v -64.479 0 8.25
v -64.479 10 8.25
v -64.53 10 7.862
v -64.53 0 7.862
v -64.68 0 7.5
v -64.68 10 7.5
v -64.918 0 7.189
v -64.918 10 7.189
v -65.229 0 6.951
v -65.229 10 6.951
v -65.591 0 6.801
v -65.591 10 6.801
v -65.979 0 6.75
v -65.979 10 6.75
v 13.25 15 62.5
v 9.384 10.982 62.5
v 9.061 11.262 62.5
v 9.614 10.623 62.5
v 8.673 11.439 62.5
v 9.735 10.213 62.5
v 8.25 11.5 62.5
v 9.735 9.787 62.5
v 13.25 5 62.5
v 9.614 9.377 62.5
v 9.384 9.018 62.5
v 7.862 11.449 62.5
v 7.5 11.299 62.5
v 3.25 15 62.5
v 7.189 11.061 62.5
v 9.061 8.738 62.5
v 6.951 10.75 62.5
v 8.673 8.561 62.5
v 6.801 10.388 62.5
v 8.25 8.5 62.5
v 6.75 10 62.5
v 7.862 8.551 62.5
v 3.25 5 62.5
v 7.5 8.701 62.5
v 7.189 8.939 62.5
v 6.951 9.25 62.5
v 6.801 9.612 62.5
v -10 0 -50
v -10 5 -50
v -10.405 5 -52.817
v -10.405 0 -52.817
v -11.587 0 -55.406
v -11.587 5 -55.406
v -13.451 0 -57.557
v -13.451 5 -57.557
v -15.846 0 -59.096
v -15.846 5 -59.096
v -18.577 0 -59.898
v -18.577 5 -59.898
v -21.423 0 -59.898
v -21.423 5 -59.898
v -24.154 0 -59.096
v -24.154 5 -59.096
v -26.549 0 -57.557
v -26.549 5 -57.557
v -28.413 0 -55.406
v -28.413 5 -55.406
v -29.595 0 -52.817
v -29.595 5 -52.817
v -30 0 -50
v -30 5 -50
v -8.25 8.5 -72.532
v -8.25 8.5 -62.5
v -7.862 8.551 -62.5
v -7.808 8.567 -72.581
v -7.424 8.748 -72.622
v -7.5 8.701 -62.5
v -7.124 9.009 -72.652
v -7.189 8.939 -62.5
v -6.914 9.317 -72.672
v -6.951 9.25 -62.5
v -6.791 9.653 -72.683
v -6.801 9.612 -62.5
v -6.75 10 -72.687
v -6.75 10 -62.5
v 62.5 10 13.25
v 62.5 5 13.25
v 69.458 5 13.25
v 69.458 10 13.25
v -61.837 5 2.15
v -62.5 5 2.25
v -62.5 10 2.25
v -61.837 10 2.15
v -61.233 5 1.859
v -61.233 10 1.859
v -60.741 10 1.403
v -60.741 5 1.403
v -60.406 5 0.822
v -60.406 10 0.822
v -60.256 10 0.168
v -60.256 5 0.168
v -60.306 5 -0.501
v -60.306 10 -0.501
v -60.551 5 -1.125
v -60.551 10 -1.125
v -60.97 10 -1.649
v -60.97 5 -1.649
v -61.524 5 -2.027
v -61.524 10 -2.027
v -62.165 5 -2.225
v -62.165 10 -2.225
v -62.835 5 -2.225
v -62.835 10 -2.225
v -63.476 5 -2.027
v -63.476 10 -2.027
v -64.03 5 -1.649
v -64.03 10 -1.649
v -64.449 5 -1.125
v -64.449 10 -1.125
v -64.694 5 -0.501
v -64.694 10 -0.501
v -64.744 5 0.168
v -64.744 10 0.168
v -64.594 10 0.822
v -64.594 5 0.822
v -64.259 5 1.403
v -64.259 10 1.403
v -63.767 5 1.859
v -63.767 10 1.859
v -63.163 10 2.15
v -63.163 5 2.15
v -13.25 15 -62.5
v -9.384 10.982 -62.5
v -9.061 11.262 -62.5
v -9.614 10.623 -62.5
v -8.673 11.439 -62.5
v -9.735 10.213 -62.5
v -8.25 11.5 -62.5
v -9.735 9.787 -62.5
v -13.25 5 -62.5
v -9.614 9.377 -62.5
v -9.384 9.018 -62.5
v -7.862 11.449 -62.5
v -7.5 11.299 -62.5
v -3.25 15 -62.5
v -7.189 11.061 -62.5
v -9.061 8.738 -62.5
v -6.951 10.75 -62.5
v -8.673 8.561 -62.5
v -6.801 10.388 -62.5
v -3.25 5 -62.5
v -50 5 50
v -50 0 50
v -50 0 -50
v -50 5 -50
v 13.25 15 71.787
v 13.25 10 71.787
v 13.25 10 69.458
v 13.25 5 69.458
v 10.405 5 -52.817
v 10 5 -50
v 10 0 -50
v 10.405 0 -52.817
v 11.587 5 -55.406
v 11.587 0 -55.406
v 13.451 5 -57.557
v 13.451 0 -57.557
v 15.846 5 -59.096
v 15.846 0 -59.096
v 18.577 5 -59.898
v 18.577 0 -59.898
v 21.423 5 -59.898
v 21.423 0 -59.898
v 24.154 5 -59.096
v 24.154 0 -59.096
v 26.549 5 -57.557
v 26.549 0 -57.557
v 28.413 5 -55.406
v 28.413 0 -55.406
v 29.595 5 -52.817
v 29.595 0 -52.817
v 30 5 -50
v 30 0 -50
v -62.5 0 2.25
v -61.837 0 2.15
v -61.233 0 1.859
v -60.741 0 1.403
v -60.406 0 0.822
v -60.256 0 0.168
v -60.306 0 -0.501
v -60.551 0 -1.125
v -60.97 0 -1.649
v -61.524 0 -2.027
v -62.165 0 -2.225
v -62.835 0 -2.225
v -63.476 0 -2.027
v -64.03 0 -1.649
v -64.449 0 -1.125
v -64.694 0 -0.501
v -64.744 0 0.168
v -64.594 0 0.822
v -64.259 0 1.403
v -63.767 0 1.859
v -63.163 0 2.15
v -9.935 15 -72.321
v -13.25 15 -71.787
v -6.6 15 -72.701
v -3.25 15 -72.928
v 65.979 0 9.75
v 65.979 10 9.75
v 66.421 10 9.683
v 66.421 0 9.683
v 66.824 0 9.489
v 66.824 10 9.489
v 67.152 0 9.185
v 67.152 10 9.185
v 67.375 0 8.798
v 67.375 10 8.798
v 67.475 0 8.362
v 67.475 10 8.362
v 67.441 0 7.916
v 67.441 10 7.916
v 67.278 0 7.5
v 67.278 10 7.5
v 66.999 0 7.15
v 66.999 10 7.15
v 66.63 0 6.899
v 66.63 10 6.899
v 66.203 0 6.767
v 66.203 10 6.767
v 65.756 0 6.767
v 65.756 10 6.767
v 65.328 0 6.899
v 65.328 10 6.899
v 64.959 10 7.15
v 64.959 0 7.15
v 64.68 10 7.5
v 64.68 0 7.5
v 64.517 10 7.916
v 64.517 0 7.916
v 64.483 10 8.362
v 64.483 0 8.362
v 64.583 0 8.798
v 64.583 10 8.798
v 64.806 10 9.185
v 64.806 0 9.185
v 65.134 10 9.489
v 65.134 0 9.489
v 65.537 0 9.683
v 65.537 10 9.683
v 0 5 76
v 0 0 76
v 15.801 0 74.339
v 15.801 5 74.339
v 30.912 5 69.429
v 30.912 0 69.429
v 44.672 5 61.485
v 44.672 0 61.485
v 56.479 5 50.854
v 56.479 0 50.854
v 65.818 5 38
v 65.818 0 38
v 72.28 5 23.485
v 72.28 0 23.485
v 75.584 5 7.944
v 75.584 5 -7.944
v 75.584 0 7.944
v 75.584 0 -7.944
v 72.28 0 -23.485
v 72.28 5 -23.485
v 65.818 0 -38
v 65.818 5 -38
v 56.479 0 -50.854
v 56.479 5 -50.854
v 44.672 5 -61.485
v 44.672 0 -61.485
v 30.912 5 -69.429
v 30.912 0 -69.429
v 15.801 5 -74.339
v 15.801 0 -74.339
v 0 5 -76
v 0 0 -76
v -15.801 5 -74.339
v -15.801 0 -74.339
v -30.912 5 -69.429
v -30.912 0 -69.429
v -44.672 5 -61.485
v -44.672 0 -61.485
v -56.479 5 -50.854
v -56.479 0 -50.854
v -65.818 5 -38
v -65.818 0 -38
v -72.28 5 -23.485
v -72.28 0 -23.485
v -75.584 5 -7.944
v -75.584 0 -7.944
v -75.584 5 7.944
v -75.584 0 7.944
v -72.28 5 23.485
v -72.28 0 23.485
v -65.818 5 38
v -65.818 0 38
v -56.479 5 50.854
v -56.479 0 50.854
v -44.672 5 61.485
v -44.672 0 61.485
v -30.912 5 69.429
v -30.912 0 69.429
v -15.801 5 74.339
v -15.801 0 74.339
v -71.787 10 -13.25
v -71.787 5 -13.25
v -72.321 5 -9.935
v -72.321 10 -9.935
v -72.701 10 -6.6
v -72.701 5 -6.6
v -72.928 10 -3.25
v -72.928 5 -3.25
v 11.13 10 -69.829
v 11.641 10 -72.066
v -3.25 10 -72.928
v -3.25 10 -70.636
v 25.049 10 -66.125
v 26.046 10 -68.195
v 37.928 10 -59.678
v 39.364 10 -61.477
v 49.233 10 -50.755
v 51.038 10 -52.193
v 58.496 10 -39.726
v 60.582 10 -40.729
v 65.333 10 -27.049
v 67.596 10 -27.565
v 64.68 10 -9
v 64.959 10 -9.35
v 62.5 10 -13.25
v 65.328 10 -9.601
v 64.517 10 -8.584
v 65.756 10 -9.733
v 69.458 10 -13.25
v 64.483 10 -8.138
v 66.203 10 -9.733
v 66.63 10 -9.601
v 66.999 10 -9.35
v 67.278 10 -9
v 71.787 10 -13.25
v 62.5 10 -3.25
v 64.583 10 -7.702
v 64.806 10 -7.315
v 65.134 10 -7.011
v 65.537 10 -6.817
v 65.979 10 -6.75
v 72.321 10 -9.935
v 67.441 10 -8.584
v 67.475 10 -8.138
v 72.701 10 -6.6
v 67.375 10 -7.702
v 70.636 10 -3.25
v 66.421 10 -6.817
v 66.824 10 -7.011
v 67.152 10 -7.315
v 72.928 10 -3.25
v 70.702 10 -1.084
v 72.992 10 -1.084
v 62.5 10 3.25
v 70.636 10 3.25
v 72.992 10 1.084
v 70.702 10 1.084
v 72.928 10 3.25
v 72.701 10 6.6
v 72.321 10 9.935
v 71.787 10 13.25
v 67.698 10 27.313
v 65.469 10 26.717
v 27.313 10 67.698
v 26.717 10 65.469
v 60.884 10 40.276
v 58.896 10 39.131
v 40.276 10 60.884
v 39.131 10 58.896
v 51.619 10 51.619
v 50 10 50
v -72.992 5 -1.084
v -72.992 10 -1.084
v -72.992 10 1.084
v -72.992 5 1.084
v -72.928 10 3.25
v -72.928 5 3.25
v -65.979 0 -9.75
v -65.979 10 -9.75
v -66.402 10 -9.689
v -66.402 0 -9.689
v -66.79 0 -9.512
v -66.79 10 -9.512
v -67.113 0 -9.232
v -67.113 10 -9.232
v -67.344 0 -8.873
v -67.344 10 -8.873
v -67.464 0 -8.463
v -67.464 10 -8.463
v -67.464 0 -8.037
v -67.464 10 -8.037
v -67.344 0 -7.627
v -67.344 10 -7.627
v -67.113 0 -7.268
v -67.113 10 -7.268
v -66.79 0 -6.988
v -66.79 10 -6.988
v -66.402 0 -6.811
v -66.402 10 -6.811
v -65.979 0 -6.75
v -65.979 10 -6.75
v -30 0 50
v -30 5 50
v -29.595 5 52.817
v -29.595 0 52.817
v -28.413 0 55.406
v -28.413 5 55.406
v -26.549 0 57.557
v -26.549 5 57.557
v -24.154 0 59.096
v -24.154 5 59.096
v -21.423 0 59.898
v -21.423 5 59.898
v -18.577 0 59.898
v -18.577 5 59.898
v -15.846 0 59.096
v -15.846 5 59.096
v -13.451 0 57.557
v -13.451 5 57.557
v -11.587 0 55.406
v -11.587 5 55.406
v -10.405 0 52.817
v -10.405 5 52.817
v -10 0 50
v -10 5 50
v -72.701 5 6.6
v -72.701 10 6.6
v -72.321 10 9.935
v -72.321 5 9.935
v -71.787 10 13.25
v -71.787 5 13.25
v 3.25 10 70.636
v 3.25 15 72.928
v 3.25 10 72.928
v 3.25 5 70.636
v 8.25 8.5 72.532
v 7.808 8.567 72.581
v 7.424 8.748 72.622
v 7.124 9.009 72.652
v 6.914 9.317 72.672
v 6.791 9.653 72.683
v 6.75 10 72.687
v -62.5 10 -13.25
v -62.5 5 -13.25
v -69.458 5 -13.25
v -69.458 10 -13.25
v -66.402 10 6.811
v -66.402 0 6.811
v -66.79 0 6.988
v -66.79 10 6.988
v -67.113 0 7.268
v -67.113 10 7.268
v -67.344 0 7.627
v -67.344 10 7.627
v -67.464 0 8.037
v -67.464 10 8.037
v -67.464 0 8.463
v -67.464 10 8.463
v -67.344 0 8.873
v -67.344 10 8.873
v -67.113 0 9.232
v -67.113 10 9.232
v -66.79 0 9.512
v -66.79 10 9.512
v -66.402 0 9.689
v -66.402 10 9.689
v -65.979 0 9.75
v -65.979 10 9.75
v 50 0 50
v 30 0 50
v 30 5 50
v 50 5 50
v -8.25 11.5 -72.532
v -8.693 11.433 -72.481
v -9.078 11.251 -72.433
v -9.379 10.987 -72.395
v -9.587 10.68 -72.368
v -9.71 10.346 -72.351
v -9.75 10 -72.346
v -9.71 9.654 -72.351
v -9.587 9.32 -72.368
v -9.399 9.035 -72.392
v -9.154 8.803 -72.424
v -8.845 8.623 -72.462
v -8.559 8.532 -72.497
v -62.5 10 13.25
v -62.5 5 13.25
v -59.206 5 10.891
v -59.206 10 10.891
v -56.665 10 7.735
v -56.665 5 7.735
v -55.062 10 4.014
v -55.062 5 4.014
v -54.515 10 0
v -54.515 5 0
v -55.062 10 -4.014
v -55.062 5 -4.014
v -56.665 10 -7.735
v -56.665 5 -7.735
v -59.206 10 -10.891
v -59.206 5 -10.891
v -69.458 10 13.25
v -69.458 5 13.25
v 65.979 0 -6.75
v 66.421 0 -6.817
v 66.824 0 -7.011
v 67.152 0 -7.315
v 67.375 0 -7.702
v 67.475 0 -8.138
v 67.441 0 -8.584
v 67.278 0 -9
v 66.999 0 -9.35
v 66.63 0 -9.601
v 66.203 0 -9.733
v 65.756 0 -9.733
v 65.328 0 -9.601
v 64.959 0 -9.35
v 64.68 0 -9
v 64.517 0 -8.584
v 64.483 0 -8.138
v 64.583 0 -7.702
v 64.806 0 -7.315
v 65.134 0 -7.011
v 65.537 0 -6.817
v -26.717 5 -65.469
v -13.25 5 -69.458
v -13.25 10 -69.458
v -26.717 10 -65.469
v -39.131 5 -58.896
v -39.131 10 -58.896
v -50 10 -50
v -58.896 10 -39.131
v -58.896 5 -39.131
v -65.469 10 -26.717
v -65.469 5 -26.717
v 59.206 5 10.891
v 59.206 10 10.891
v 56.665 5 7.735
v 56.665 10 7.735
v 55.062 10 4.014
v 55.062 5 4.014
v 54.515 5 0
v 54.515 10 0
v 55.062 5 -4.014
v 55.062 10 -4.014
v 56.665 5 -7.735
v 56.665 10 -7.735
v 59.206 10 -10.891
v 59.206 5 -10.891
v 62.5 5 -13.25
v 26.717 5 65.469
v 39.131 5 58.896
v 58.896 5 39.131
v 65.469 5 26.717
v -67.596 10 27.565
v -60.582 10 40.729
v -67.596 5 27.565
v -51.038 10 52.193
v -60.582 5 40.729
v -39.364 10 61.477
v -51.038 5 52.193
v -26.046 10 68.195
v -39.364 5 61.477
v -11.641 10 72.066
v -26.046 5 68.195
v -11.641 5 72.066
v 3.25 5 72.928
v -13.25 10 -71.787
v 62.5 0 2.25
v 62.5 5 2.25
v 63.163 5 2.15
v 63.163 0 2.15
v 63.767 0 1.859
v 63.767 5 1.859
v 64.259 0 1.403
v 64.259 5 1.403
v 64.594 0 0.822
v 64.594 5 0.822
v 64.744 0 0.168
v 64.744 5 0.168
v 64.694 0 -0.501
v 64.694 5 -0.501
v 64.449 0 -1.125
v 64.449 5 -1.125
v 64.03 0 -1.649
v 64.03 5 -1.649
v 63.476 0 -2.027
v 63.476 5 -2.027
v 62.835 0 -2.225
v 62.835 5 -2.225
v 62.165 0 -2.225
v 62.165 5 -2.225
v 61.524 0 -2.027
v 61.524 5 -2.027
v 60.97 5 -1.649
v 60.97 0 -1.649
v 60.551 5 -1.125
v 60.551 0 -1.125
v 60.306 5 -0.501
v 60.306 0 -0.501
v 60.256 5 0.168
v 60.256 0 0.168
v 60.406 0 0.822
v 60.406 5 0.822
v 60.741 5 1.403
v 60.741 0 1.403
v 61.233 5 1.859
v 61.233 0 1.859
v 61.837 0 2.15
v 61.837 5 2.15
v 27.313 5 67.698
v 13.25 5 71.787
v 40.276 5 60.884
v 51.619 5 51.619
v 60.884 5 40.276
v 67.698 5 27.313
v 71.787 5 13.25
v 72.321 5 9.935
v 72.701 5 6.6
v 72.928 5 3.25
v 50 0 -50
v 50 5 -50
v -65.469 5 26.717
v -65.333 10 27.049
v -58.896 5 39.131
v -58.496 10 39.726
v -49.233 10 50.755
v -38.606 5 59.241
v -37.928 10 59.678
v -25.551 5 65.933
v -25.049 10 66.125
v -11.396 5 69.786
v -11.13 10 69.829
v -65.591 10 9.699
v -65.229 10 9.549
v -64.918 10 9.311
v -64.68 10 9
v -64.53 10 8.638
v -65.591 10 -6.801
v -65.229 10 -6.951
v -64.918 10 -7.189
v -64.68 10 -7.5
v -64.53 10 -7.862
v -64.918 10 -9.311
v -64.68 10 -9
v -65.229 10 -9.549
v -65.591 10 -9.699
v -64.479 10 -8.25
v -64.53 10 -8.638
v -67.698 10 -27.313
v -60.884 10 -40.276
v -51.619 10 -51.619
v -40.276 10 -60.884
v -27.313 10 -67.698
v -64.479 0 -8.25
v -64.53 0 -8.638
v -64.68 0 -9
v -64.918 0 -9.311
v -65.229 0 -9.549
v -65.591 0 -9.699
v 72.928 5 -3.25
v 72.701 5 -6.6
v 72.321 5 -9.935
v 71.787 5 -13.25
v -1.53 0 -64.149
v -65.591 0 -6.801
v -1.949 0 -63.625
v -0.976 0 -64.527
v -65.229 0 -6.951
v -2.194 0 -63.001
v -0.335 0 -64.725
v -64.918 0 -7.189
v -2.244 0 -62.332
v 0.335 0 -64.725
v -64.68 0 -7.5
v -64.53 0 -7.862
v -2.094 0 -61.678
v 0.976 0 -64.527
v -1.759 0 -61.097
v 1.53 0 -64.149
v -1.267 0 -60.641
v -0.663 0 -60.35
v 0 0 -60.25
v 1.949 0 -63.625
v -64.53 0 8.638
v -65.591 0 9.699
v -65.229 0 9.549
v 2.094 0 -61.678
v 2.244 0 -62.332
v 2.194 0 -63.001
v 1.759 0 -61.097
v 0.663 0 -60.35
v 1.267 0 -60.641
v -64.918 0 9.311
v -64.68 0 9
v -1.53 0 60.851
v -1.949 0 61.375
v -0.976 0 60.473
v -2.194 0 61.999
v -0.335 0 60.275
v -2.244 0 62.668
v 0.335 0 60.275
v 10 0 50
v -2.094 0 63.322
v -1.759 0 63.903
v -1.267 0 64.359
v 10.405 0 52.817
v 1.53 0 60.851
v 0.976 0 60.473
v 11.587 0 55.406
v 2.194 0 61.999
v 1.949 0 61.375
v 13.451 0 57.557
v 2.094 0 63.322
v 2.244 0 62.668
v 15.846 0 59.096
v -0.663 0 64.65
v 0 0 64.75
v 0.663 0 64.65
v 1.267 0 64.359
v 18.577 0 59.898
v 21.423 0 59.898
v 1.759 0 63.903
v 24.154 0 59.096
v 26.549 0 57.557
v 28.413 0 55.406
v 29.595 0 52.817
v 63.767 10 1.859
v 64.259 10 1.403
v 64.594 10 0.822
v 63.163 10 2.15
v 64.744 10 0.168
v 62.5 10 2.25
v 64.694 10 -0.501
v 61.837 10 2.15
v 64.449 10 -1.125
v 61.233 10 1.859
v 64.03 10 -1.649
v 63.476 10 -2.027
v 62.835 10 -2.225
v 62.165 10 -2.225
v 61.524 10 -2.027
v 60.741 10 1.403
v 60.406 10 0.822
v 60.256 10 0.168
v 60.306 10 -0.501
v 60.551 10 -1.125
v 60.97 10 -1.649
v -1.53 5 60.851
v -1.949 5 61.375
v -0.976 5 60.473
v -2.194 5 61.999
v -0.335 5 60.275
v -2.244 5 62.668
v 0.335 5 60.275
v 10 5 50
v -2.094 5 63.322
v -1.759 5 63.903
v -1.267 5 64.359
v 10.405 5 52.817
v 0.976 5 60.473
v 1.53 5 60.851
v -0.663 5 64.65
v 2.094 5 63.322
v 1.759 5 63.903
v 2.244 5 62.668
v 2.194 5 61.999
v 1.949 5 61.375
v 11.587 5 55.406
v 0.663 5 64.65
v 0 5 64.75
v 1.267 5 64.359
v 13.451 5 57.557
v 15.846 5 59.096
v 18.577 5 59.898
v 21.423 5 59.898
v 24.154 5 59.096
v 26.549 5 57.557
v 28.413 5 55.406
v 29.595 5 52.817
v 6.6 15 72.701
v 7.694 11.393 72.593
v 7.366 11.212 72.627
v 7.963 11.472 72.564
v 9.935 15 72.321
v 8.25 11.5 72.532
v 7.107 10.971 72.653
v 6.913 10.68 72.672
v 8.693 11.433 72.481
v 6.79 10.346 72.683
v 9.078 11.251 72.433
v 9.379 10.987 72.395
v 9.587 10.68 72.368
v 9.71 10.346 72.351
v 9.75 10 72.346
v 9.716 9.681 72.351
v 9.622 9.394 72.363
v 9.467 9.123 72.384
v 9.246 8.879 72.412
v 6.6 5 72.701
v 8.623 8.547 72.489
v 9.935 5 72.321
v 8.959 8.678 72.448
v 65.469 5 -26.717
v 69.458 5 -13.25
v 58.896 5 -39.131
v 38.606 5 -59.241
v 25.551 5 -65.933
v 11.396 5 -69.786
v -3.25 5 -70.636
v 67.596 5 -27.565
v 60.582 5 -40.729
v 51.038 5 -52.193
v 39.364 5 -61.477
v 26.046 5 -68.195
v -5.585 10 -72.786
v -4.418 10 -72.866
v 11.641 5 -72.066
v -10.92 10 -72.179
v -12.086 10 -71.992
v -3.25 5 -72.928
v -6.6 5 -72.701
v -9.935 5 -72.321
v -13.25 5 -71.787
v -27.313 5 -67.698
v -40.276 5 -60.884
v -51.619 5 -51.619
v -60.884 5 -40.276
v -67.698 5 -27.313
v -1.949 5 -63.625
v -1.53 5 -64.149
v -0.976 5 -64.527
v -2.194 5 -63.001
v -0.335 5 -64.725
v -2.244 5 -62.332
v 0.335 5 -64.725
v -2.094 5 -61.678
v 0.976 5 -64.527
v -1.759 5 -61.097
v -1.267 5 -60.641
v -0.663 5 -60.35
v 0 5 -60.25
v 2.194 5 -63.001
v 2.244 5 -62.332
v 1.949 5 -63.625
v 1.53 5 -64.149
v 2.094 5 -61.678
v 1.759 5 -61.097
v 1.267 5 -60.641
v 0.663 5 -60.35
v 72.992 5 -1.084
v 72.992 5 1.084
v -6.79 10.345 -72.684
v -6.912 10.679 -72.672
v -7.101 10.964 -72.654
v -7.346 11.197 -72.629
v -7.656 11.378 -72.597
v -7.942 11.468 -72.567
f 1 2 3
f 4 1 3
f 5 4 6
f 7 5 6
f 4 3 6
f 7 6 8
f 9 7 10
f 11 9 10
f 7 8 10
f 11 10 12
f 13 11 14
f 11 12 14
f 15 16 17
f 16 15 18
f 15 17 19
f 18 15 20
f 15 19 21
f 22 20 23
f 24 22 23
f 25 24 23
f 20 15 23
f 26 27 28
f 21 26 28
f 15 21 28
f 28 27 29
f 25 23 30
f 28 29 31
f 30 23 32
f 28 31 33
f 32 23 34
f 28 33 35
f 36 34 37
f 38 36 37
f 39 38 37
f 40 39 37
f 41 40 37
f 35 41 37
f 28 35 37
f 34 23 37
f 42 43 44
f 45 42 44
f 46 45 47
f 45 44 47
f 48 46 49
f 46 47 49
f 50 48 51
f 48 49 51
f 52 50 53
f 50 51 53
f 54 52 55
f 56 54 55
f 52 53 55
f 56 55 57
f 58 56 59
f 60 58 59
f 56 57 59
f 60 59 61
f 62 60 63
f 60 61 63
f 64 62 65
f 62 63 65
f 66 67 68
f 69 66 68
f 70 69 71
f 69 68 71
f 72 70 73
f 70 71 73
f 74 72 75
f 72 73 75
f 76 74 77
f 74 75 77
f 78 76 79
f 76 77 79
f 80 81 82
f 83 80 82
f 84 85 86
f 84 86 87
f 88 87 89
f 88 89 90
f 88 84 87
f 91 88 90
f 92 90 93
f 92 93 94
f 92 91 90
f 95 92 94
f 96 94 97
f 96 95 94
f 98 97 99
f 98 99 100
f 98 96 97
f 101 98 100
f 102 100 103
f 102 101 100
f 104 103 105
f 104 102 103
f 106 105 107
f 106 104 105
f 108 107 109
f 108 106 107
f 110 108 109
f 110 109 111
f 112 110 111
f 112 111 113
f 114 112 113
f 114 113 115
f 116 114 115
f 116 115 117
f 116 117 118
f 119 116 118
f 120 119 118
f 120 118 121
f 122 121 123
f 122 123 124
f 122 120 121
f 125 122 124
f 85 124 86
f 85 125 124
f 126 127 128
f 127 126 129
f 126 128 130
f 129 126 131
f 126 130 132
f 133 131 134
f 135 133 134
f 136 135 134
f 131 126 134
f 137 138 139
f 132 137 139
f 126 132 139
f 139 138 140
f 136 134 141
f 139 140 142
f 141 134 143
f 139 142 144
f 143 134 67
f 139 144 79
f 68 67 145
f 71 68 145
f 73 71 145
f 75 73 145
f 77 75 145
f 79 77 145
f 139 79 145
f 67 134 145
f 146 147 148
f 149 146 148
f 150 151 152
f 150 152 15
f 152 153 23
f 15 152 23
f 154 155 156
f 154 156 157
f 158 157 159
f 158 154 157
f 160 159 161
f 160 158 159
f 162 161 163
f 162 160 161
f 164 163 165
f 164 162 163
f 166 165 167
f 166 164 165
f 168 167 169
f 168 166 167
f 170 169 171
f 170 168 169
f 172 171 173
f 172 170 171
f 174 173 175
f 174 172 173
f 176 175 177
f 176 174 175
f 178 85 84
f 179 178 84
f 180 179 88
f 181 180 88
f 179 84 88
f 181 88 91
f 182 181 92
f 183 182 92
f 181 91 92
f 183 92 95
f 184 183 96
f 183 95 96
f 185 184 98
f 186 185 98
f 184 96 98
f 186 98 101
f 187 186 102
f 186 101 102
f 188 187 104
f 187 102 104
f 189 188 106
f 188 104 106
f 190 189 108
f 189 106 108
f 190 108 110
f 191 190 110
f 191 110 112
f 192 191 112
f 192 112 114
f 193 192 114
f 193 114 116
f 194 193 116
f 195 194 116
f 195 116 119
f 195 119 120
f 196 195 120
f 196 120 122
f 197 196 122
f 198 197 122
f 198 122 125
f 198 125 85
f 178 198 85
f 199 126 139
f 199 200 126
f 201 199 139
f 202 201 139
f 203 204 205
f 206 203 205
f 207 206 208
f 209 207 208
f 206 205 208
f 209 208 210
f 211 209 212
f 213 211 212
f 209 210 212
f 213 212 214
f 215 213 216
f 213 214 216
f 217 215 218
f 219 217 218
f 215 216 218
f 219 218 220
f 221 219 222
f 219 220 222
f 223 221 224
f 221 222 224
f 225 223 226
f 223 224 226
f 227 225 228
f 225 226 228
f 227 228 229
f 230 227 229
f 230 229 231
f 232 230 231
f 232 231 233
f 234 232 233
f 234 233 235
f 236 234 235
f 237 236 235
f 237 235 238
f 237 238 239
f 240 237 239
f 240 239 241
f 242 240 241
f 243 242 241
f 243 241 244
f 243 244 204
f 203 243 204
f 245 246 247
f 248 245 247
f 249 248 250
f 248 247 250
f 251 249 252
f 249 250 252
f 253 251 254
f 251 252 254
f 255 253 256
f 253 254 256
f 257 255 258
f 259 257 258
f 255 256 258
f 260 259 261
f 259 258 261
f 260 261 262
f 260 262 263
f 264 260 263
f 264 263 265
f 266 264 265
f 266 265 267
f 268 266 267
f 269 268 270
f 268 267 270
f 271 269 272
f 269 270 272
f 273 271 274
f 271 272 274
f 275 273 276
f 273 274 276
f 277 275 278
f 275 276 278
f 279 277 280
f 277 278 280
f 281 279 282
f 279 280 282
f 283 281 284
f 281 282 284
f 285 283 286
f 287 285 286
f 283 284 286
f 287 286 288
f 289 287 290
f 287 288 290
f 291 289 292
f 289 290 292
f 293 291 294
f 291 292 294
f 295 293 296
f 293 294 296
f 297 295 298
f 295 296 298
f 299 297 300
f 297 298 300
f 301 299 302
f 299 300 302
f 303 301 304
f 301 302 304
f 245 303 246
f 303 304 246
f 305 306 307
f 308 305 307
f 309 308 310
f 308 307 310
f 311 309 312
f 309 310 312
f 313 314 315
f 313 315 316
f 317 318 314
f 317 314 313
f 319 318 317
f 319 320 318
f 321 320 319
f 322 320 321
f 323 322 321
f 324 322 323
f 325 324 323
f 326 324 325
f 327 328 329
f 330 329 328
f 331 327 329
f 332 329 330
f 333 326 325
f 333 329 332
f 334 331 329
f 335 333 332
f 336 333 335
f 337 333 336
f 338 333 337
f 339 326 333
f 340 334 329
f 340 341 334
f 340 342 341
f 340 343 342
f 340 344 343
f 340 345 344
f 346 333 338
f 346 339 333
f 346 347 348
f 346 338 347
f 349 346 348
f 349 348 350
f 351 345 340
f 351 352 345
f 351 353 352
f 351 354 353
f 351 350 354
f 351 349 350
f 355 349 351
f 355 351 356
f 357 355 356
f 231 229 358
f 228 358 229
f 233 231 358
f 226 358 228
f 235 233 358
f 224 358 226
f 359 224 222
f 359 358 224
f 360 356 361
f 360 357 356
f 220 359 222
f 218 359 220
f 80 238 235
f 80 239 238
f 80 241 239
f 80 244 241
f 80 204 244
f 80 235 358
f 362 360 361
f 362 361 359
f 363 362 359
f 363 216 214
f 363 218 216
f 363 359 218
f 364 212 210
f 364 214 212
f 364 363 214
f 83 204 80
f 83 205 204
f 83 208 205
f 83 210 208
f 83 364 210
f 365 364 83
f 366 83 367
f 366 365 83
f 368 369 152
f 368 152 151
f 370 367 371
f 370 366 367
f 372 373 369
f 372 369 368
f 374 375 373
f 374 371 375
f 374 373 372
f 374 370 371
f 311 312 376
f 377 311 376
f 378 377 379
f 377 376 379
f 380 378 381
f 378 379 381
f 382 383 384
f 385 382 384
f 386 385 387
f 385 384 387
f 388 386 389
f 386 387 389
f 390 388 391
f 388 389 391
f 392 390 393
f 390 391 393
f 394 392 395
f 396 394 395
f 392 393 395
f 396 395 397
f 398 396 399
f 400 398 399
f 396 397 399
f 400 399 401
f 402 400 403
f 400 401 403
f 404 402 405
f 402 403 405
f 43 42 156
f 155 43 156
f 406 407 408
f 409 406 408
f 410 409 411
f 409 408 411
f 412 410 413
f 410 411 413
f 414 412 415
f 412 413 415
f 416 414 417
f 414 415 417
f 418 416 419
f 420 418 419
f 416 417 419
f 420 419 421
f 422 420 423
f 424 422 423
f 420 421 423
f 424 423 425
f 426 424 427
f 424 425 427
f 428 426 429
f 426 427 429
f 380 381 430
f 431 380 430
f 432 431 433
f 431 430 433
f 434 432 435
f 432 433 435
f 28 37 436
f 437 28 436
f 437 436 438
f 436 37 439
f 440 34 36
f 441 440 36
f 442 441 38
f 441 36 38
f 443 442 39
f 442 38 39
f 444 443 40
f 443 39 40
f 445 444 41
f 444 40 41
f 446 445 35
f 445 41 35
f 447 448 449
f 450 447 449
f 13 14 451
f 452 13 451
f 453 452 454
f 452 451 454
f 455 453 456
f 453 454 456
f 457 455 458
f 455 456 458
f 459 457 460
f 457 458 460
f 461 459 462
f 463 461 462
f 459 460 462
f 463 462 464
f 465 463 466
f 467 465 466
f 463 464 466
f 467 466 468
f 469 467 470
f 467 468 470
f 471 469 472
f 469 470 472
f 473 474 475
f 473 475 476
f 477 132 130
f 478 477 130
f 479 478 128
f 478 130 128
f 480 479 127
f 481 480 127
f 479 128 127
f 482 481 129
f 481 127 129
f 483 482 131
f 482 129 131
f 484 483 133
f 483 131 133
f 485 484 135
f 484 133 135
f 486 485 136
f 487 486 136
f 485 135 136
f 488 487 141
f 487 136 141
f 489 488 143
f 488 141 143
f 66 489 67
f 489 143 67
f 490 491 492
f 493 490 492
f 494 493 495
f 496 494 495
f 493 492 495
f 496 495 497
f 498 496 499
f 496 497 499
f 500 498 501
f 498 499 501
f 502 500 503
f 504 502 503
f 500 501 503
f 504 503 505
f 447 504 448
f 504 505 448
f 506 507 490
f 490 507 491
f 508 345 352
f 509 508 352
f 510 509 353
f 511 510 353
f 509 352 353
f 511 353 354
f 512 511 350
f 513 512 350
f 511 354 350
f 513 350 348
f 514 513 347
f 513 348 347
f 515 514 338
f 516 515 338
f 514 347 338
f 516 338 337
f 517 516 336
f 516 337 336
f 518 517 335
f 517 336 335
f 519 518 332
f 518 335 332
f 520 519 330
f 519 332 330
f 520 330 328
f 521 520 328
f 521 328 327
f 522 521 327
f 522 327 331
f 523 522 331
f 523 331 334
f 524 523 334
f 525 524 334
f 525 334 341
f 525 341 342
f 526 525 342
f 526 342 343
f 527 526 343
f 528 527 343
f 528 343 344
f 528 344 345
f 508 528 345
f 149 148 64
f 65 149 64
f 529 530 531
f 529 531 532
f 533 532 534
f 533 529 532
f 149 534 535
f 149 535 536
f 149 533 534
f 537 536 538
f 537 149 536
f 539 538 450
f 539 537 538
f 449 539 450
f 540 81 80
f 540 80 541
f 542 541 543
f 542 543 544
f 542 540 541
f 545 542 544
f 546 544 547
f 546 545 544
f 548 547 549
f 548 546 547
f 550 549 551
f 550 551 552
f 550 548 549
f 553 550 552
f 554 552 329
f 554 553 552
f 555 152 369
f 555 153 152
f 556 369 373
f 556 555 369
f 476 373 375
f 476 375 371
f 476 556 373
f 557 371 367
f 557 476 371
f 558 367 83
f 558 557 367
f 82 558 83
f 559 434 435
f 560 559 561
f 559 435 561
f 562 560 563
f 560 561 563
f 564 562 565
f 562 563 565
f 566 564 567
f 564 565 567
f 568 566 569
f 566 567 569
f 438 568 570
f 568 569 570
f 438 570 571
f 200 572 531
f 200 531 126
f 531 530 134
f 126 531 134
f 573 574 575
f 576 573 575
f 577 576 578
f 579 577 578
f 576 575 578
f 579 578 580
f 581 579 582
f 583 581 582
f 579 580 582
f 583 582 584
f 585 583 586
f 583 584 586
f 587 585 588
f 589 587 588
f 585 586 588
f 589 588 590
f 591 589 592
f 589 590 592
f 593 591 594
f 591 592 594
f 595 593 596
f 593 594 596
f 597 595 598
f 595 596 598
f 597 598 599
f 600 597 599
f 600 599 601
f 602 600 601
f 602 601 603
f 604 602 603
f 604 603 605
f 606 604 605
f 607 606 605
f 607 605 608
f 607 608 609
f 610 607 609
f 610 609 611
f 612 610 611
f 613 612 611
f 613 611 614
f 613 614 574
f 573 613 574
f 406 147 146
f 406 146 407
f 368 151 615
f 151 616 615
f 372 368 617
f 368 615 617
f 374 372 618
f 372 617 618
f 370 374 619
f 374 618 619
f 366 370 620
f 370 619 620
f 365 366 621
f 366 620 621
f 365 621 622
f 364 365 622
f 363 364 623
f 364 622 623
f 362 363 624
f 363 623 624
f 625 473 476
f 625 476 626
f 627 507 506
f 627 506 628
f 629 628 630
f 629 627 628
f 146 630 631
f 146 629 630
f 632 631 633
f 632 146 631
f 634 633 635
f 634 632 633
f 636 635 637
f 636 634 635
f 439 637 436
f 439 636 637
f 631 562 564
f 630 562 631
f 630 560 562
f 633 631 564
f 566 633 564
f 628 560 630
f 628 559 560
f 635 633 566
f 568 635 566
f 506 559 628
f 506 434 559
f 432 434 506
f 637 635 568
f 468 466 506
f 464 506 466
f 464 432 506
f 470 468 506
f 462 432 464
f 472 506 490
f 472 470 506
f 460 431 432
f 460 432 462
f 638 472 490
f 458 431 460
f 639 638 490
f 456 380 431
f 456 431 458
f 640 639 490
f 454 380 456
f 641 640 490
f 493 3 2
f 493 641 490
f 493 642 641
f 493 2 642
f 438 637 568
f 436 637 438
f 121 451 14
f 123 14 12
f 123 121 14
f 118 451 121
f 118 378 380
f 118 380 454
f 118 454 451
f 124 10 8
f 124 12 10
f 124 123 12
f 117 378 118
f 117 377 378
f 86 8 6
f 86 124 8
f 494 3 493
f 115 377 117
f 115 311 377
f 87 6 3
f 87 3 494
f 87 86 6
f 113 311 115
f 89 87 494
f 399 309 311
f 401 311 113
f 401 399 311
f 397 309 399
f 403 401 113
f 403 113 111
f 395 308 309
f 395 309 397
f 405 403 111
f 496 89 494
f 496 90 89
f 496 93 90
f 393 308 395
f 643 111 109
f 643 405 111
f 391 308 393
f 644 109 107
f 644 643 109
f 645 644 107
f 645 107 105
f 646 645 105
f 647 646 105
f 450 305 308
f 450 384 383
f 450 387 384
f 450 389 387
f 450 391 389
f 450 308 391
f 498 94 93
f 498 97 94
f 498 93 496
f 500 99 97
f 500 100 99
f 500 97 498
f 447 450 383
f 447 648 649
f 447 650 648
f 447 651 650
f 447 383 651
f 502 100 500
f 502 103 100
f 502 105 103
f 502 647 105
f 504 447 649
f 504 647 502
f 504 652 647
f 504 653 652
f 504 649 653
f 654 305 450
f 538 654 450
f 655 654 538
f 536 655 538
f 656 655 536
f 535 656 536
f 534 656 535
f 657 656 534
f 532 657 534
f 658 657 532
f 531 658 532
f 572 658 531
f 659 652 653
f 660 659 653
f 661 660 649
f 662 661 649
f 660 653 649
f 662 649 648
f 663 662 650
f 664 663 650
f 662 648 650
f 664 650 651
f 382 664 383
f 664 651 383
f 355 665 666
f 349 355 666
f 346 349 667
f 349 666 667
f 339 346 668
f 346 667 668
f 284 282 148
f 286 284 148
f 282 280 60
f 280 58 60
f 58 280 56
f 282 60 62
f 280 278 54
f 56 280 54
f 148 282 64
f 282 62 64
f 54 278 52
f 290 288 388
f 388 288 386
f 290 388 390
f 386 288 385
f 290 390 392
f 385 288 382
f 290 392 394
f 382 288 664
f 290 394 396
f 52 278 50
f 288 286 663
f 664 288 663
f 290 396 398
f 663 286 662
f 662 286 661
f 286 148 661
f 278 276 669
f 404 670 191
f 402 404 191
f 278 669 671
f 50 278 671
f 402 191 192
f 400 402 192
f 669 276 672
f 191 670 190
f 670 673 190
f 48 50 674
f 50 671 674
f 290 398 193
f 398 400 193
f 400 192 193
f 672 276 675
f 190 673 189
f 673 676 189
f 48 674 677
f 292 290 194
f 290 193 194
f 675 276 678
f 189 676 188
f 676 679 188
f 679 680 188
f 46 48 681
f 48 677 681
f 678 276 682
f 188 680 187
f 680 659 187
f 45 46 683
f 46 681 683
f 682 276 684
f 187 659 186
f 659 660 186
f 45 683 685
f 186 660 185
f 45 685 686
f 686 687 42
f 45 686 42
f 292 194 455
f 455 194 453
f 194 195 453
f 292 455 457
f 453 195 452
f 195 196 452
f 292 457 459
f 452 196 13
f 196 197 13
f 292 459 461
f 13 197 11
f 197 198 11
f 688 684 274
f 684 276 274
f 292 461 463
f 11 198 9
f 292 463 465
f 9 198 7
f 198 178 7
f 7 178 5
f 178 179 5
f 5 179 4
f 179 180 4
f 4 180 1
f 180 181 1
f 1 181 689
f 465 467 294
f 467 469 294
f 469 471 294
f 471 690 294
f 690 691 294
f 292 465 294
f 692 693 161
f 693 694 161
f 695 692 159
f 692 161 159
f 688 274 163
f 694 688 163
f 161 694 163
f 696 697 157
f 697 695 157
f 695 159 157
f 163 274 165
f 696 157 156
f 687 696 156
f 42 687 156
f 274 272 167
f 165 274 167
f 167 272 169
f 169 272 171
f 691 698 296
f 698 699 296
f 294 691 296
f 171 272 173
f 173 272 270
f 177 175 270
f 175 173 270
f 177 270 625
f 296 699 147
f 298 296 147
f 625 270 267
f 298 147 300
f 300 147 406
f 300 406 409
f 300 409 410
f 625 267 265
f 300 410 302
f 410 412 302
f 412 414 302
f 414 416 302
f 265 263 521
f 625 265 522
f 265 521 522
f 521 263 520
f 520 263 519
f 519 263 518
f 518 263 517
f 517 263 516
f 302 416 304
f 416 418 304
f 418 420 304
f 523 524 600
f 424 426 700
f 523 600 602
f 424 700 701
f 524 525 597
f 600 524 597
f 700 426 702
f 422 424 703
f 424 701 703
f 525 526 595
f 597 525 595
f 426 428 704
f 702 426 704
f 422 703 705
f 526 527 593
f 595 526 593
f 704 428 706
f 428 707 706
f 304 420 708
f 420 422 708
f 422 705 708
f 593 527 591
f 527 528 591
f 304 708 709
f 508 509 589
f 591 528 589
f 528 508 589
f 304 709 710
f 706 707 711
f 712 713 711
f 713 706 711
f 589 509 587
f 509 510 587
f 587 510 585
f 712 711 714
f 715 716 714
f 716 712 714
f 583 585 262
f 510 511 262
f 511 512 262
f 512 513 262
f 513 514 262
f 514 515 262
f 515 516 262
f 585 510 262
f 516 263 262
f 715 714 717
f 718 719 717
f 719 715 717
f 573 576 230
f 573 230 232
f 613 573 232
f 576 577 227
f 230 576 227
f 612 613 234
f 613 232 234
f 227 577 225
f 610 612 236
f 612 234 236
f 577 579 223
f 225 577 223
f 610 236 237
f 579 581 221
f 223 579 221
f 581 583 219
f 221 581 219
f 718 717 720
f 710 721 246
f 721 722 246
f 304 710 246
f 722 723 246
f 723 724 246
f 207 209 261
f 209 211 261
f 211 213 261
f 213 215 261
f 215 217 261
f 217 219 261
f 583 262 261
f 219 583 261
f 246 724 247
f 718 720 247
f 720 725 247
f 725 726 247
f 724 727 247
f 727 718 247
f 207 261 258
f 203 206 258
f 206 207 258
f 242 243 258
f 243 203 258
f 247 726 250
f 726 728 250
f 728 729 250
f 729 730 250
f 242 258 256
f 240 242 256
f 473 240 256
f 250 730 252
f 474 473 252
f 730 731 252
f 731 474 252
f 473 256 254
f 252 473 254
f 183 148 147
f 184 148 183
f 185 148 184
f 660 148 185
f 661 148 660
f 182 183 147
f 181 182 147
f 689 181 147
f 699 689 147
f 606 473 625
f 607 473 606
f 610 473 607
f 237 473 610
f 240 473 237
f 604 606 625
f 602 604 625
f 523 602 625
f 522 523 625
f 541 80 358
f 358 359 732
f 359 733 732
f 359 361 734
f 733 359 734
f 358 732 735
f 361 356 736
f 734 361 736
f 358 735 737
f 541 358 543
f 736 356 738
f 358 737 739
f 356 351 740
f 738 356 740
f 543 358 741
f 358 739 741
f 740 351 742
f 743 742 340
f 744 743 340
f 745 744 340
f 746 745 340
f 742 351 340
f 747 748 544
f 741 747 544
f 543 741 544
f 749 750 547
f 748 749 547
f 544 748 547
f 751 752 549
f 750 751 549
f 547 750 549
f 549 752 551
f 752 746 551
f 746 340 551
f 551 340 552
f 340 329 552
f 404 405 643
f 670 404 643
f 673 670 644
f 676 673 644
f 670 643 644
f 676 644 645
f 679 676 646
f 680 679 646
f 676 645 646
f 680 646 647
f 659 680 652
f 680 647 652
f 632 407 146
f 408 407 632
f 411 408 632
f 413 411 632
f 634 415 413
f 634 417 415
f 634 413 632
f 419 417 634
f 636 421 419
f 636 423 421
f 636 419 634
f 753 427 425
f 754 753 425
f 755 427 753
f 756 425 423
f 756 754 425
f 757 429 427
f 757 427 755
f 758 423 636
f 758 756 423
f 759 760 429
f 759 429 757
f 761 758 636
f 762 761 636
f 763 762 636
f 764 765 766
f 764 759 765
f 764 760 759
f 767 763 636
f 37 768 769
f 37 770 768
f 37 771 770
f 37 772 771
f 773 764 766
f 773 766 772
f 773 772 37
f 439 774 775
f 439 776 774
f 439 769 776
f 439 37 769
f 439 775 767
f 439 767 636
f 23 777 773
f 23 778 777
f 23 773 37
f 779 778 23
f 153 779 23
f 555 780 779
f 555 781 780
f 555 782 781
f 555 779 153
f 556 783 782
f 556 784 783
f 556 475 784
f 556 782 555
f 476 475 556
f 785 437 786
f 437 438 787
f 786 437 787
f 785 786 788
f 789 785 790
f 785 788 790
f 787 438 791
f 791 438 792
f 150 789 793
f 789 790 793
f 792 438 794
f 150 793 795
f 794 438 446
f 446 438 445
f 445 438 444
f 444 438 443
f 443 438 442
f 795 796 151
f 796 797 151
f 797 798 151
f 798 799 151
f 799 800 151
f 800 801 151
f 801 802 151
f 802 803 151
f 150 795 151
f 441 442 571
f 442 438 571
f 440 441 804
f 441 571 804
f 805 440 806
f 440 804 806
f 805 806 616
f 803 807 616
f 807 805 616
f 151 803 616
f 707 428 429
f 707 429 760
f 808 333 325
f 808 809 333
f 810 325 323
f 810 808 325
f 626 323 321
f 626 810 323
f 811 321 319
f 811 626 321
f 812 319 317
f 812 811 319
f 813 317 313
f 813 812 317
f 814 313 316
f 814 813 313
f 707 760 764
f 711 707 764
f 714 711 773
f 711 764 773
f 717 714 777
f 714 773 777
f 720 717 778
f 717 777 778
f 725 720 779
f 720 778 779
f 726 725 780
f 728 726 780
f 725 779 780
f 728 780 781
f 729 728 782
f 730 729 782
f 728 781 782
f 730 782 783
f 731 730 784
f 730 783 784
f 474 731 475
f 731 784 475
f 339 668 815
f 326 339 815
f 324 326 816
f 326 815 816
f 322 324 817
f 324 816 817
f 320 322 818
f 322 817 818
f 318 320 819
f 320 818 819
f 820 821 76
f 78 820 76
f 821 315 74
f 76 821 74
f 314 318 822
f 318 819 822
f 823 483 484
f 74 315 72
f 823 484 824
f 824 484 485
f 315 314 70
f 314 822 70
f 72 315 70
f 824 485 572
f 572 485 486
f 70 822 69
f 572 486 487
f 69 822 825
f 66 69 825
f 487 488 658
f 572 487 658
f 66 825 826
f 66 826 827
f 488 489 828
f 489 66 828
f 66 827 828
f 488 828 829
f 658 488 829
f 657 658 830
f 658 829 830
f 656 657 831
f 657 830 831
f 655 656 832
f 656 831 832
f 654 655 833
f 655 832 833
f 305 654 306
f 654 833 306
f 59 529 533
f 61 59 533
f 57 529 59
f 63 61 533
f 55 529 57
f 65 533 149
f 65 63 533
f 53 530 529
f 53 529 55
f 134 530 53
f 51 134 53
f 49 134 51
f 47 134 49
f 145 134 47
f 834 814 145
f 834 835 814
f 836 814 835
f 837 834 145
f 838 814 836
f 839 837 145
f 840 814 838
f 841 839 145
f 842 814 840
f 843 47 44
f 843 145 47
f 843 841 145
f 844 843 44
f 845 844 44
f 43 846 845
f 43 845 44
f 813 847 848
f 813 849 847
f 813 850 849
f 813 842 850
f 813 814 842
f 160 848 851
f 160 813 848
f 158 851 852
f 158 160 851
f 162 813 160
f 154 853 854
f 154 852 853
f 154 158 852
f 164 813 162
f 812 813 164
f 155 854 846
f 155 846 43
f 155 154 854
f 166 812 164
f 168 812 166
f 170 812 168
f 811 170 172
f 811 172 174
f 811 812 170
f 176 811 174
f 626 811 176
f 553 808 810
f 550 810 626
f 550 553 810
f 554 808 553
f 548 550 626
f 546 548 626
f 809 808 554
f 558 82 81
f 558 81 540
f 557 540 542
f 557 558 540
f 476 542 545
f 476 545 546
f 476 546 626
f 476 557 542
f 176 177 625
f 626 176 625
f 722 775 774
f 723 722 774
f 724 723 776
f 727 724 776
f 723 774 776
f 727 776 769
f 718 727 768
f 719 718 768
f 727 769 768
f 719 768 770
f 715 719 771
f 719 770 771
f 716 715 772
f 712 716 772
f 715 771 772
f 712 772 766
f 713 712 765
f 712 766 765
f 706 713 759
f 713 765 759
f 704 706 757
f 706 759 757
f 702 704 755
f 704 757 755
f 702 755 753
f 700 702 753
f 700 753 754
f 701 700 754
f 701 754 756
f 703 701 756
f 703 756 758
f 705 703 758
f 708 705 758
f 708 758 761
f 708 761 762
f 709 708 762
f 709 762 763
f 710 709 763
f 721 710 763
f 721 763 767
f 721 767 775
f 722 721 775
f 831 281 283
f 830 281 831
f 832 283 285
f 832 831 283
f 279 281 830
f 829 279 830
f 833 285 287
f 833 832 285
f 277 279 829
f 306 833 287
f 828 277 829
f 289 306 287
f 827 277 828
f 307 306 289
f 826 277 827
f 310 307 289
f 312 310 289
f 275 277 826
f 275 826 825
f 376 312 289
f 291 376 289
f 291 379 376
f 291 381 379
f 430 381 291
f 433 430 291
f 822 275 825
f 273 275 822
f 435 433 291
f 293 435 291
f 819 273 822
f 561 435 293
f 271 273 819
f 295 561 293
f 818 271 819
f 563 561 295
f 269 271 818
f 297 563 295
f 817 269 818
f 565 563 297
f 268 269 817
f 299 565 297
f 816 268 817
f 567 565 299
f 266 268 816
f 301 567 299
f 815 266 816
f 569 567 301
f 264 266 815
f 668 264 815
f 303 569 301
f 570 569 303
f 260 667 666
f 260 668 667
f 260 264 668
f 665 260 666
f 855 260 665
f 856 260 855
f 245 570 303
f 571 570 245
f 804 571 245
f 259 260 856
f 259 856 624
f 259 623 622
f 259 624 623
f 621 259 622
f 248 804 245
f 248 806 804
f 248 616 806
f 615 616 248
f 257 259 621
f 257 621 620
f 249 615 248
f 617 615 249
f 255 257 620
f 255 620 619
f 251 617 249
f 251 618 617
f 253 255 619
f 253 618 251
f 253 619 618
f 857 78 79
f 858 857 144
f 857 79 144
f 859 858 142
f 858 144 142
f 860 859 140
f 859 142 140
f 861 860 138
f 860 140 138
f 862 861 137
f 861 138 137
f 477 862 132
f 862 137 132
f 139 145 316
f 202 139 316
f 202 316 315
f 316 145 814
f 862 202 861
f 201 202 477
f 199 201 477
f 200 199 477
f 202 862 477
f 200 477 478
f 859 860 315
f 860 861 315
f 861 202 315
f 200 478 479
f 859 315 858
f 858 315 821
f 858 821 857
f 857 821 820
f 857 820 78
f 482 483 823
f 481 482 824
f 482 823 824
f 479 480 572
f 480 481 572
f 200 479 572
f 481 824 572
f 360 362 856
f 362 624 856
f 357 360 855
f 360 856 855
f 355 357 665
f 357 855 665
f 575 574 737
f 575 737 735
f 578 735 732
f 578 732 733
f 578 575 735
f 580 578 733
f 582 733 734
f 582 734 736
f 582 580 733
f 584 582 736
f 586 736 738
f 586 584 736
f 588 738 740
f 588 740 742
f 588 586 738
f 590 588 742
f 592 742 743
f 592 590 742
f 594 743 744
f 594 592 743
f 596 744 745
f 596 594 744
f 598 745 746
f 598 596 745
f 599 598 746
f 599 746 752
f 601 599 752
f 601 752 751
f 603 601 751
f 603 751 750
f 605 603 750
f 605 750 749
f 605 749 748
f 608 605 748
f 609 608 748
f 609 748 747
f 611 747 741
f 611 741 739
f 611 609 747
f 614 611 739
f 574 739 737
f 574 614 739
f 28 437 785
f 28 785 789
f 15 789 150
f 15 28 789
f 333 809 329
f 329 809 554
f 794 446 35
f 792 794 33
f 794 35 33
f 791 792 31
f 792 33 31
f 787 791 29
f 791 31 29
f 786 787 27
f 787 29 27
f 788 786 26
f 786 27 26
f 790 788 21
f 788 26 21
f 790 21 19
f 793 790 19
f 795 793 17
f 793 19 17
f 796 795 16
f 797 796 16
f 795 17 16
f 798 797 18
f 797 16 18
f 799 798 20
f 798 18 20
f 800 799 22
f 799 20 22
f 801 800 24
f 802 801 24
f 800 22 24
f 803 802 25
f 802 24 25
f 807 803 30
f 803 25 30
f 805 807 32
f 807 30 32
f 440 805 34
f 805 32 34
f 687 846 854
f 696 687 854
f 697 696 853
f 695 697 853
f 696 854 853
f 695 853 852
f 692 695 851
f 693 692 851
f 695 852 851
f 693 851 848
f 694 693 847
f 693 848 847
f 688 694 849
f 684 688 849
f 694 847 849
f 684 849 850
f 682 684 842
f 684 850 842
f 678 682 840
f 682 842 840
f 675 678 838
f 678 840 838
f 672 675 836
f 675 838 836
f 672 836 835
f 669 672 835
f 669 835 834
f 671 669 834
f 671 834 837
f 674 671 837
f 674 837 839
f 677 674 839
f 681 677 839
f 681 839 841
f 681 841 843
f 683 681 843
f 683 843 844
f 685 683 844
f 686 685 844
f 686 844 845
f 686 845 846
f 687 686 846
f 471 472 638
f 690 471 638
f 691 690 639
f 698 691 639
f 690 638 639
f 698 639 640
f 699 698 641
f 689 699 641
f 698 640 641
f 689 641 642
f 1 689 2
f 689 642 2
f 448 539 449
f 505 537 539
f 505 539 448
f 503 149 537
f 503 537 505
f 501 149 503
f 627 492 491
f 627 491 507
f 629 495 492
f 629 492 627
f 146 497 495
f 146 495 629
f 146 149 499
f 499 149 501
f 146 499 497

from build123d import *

# Parameters (mm, degrees)
SKETCH1_R           = 76
SKETCH1_W           = 100
SKETCH1_H           = 100
BOSS_EXTRUDE1_DEPTH = 5
SKETCH2_R           = 2.25
CUT_EXTRUDE1_DEPTH  = 10
SKETCH5_R           = 73
SKETCH5_R_2         = 70.710678119
BOSS_EXTRUDE3_DEPTH = 5
BOSS_EXTRUDE6_DEPTH = 10
CUT_EXTRUDE4_DEPTH  = 30
CUT_EXTRUDE5_DEPTH  = 70
BOSS_EXTRUDE7_DEPTH = 5
SKETCH14_R          = 1.5
CUT_EXTRUDE6_DEPTH  = 44
CUT_EXTRUDE7_DEPTH  = 30
SKETCH17_R          = 2.25
BOSS_EXTRUDE9_DEPTH = 5


with BuildPart() as part:
    # Sketch1 → Boss-Extrude1 (new body)
    with BuildSketch(Plane(origin=(0, 0, 0), x_dir=(1, 0, 0), z_dir=(0, 1, 0))):
        with Locations(Location((0, 0, 0), (0, 0, 270))):
            Circle(SKETCH1_R)
        Rectangle(SKETCH1_W, SKETCH1_H, mode=Mode.SUBTRACT)
    extrude(amount=BOSS_EXTRUDE1_DEPTH)

    # Sketch2 → Cut-Extrude1 (cut)
    with BuildSketch(Plane(origin=(0, 5, 0), x_dir=(1, 0, 0), z_dir=(0, 1, 0))):
        with Locations(Location((-62.5, 0, 0), (0, 0, 270))):
            Circle(SKETCH2_R)
        with Locations(Location((0, 62.5, 0), (0, 0, 270))):
            Circle(SKETCH2_R)
        with Locations(Location((62.5, 0, 0), (0, 0, 270))):
            Circle(SKETCH2_R)
        with Locations(Location((0, -62.5, 0), (0, 0, 270))):
            Circle(SKETCH2_R)
    extrude(amount=-CUT_EXTRUDE1_DEPTH, mode=Mode.SUBTRACT)

    # Sketch5 → Boss-Extrude3 (add)
    with BuildSketch(Plane(origin=(0, 5, 0), x_dir=(1, 0, 0), z_dir=(0, 1, 0))):
        with Locations(Location((0, 0, 0), (0, 0, 270))):
            Circle(SKETCH5_R)
        with Locations(Location((0, 0, 0), (0, 0, 135))):
            Circle(SKETCH5_R_2, mode=Mode.SUBTRACT)
    extrude(amount=BOSS_EXTRUDE3_DEPTH)

    # Sketch10 → Boss-Extrude6 (add)
    with BuildSketch(Plane(origin=(0, 5, 0), x_dir=(1, 0, 0), z_dir=(0, 1, 0))):
        with BuildLine():
            Line((3.25, -62.5), (3.25, -72.927618225))
            ThreePointArc((3.25, -72.927618225), (8.269673379, -72.530079982), (13.25, -71.787446674))
            Line((13.25, -71.787446674), (13.25, -62.5))
            Line((13.25, -62.5), (3.25, -62.5))
        make_face()
        with BuildLine():
            Line((-13.25, 62.5), (-3.25, 62.5))
            Line((-3.25, 62.5), (-3.25, 70.635950478))
            ThreePointArc((-3.25, 70.635950478), (-8.270990945, 70.225285395), (-13.25, 69.458170866))
            Line((-13.25, 69.458170866), (-13.25, 62.5))
        make_face()
        with BuildLine():
            ThreePointArc((-13.25, 69.458170866), (-8.270990945, 70.225285395), (-3.25, 70.635950478))
            Line((-3.25, 70.635950478), (-3.25, 72.927618225))
            ThreePointArc((-3.25, 72.927618225), (-8.269673379, 72.530079982), (-13.25, 71.787446674))
            Line((-13.25, 71.787446674), (-13.25, 69.458170866))
        make_face()
    extrude(amount=BOSS_EXTRUDE6_DEPTH)

    # Sketch11 → Cut-Extrude4 (cut)
    with BuildSketch(Plane.XY.offset(-62.5)):
        with BuildLine():
            ThreePointArc((-6.75, 10), (-7.189339828, 11.060660172), (-8.25, 11.5))
            Line((-8.25, 11.5), (-8.25, 8.5))
            ThreePointArc((-8.25, 8.5), (-7.189339828, 8.939339828), (-6.75, 10))
        make_face()
        with BuildLine():
            Line((-8.25, 8.5), (-8.25, 11.5))
            ThreePointArc((-8.25, 11.5), (-9.75, 10), (-8.25, 8.5))
        make_face()
    extrude(amount=-CUT_EXTRUDE4_DEPTH, mode=Mode.SUBTRACT)

    # Sketch12 → Cut-Extrude5 (cut)
    with BuildSketch(Plane(origin=(0, 0, 62.5), x_dir=(-1, 0, 0), z_dir=(0, 0, -1))):
        with BuildLine():
            ThreePointArc((-6.75, 10), (-7.189339828, 11.060660172), (-8.25, 11.5))
            Line((-8.25, 11.5), (-8.25, 8.5))
            ThreePointArc((-8.25, 8.5), (-7.189339828, 8.939339828), (-6.75, 10))
        make_face()
        with BuildLine():
            Line((-8.25, 8.5), (-8.25, 11.5))
            ThreePointArc((-8.25, 11.5), (-9.75, 10), (-8.25, 8.5))
        make_face()
    extrude(amount=-CUT_EXTRUDE5_DEPTH, mode=Mode.SUBTRACT)

    # Sketch13 → Boss-Extrude7 (add)
    with BuildSketch(Plane(origin=(0, 5, 0), x_dir=(1, 0, 0), z_dir=(0, 1, 0))):
        with BuildLine():
            Line((-62.5, -13.25), (-62.5, -3.25))
            Line((-62.5, -3.25), (-72.927618225, -3.25))
            ThreePointArc((-72.927618225, -3.25), (-72.530079982, -8.269673379), (-71.787446674, -13.25))
            Line((-71.787446674, -13.25), (-62.5, -13.25))
        make_face()
        with BuildLine():
            Line((-72.927618225, 3.25), (-62.5, 3.25))
            Line((-62.5, 3.25), (-62.5, 13.25))
            Line((-62.5, 13.25), (-71.787446674, 13.25))
            ThreePointArc((-71.787446674, 13.25), (-72.530079982, 8.269673379), (-72.927618225, 3.25))
        make_face()
        with BuildLine():
            Line((71.787446674, 13.25), (62.5, 13.25))
            Line((62.5, 13.25), (62.5, 3.25))
            Line((62.5, 3.25), (72.927618225, 3.25))
            ThreePointArc((72.927618225, 3.25), (72.530079982, 8.269673379), (71.787446674, 13.25))
        make_face()
        with BuildLine():
            Line((62.5, -3.25), (62.5, -13.25))
            Line((62.5, -13.25), (71.787446674, -13.25))
            ThreePointArc((71.787446674, -13.25), (72.530079982, -8.269673379), (72.927618225, -3.25))
            Line((72.927618225, -3.25), (62.5, -3.25))
        make_face()
    extrude(amount=BOSS_EXTRUDE7_DEPTH)

    # Sketch14 → Cut-Extrude6 (cut)
    with BuildSketch(Plane(origin=(0, 10, 0), x_dir=(1, 0, 0), z_dir=(0, 1, 0))):
        with BuildLine():
            ThreePointArc((-64.479085433, 8.25), (-64.918425261, 9.310660172), (-65.979085433, 9.75))
            Line((-65.979085433, 9.75), (-65.979085433, 6.75))
            ThreePointArc((-65.979085433, 6.75), (-64.918425261, 7.189339828), (-64.479085433, 8.25))
        make_face()
        with BuildLine():
            Line((-65.979085433, 6.75), (-65.979085433, 9.75))
            ThreePointArc((-65.979085433, 9.75), (-67.479085433, 8.25), (-65.979085433, 6.75))
        make_face()
        with BuildLine():
            ThreePointArc((-65.979085433, -6.75), (-67.479085433, -8.25), (-65.979085433, -9.75))
            Line((-65.979085433, -9.75), (-65.979085433, -6.75))
        make_face()
        with BuildLine():
            Line((-65.979085433, -6.75), (-65.979085433, -9.75))
            ThreePointArc((-65.979085433, -9.75), (-64.918425261, -9.310660172), (-64.479085433, -8.25))
            ThreePointArc((-64.479085433, -8.25), (-64.918425261, -7.189339828), (-65.979085433, -6.75))
        make_face()
        with Locations(Location((65.979085433, 8.25, 0), (0, 0, 270))):
            Circle(SKETCH14_R)
        with Locations(Location((65.979085433, -8.25, 0), (0, 0, 270))):
            Circle(SKETCH14_R)
    extrude(amount=-CUT_EXTRUDE6_DEPTH, mode=Mode.SUBTRACT)

    # Sketch16 → Cut-Extrude7 (cut)
    with BuildSketch(Plane(origin=(0, 5, 0), x_dir=(1, 0, 0), z_dir=(0, 1, 0))):
        with BuildLine():
            ThreePointArc((-30, -50), (-20, -60), (-10, -50))
            Line((-10, -50), (-30, -50))
        make_face()
        with BuildLine():
            Line((30, -50), (10, -50))
            ThreePointArc((10, -50), (20, -60), (30, -50))
        make_face()
        with BuildLine():
            Line((-30, 50), (-10, 50))
            ThreePointArc((-10, 50), (-20, 60), (-30, 50))
        make_face()
        with BuildLine():
            ThreePointArc((10, 50), (20, 60), (30, 50))
            Line((30, 50), (10, 50))
        make_face()
    extrude(amount=-CUT_EXTRUDE7_DEPTH, mode=Mode.SUBTRACT)

    # Sketch17 → Boss-Extrude9 (add)
    # profile 1 of 2: a face of its own
    with BuildSketch(Plane(origin=(0, 5, 0), x_dir=(1, 0, 0), z_dir=(0, 1, 0))):
        with BuildLine():
            Line((-62.5, -3.25), (-62.5, -13.25))
            ThreePointArc((-62.5, -13.25), (-54.514590429, 0), (-62.5, 13.25))
            Line((-62.5, 13.25), (-62.5, 3.25))
            Line((-62.5, 3.25), (-70.635950478, 3.25))
            ThreePointArc((-70.635950478, 3.25), (-70.710678119, 0), (-70.635950478, -3.25))
            Line((-70.635950478, -3.25), (-62.5, -3.25))
        make_face()
        with Locations(Location((-62.5, 0, 0), (0, 0, 270))):
            Circle(SKETCH17_R, mode=Mode.SUBTRACT)
    # profile 2 of 2: a face of its own
    with BuildSketch(Plane(origin=(0, 5, 0), x_dir=(1, 0, 0), z_dir=(0, 1, 0))):
        with BuildLine():
            Line((62.5, -3.25), (62.5, -13.25))
            ThreePointArc((62.5, -13.25), (54.514590429, 0), (62.5, 13.25))
            Line((62.5, 13.25), (62.5, 3.25))
            Line((62.5, 3.25), (70.635950478, 3.25))
            ThreePointArc((70.635950478, 3.25), (70.710678119, 0), (70.635950478, -3.25))
            Line((70.635950478, -3.25), (62.5, -3.25))
        make_face()
        with Locations(Location((62.5, 0, 0), (0, 0, 270))):
            Circle(SKETCH17_R, mode=Mode.SUBTRACT)
    extrude(amount=BOSS_EXTRUDE9_DEPTH)


solid = part.part
